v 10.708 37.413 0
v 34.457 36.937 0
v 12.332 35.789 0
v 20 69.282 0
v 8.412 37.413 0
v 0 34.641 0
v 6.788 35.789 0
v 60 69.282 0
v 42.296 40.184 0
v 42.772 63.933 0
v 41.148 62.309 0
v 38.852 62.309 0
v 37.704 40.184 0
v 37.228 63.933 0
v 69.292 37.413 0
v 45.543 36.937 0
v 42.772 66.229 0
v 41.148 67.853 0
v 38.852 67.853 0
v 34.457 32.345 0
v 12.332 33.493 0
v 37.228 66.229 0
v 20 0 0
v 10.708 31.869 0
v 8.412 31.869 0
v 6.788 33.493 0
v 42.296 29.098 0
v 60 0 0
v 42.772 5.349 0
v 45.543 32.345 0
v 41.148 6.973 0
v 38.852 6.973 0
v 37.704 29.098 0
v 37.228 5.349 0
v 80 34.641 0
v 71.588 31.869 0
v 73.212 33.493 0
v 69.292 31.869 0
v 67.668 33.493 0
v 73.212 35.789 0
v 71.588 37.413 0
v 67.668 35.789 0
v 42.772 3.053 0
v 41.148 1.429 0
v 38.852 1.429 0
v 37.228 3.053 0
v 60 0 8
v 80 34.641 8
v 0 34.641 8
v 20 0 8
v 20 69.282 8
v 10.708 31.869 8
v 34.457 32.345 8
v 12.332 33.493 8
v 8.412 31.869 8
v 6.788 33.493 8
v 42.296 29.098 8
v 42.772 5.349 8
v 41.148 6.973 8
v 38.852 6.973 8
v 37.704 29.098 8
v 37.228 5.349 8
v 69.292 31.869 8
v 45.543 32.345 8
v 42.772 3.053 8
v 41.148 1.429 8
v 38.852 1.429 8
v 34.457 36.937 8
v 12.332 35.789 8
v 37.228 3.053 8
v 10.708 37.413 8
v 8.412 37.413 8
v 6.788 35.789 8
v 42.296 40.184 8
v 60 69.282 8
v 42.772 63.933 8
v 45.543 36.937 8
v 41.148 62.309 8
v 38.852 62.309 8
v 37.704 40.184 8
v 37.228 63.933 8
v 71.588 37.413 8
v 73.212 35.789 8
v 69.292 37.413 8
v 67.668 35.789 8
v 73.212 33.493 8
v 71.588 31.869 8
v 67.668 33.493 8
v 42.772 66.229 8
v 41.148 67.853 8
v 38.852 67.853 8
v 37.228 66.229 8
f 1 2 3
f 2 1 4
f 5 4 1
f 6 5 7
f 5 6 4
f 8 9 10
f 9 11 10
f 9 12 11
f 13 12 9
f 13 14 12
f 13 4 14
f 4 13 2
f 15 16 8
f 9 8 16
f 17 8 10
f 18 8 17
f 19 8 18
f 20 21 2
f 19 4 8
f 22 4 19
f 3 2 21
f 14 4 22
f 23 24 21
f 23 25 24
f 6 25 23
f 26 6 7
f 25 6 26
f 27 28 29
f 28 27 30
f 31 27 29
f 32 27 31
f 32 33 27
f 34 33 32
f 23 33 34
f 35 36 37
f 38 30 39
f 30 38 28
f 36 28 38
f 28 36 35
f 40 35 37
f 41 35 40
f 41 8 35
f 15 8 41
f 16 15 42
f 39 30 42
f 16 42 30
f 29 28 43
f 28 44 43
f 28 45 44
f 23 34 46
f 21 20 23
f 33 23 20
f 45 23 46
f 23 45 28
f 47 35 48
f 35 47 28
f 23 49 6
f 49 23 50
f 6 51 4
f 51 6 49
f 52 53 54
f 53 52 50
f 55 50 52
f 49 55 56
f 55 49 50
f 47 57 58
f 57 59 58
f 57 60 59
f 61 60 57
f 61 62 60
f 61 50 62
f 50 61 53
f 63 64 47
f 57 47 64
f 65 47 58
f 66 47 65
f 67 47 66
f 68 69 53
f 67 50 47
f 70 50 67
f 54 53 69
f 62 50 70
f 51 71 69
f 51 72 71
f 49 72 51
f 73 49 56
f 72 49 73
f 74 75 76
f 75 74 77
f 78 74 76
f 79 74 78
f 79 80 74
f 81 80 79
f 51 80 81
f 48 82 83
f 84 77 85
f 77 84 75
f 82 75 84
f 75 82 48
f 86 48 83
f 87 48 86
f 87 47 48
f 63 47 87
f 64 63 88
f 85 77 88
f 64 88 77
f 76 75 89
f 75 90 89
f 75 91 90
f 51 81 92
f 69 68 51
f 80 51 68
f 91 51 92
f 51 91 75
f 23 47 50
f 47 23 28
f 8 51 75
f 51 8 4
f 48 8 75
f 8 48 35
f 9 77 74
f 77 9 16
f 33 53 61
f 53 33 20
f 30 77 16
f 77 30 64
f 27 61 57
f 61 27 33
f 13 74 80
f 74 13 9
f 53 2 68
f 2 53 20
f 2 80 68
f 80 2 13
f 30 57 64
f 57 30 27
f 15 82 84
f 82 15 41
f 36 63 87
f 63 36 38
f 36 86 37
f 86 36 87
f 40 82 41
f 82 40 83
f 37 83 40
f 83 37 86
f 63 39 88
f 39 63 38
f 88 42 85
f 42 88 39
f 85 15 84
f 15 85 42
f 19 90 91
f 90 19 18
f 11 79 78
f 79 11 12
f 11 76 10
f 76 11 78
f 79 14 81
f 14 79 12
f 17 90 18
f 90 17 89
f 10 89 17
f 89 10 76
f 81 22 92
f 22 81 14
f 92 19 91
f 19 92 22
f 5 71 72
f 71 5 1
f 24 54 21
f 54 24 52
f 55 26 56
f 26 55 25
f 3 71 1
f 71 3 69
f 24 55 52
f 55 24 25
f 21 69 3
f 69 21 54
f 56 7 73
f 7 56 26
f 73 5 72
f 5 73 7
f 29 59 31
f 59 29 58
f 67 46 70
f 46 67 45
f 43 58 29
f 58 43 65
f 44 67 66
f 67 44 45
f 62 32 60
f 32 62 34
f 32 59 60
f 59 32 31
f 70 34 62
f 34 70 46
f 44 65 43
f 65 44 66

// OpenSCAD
$fn = 32;

// ----------------------------------------------------------------------
// Polygon plate: 6-gon R40, 4 bolt windows
// ----------------------------------------------------------------------

// --- parameters (mm) ---
sides = 6;                // number of polygon sides
plate_r = 40;             // circumscribed radius of the polygon
bore_r = 6;               // centre bore radius
bolts = 4;                // number of bolt windows
ring_r = 30.44;           // bolt-circle radius
bolt_r = 3;               // bolt window radius
plate_t = 8;              // plate thickness, Z (extrusion height)

plate_d = 2 * plate_r;  // circumscribed diameter
bore_d = 2 * bore_r;  // centre bore diameter
bolt_d = 2 * bolt_r;  // bolt window diameter
ring_d = 2 * ring_r;  // bolt-circle diameter

profile = [[80, 34.641], [60, 69.282], [20, 69.282], [0, 34.641], [20, 0], [60, 0]];  // primary outline, 6 points, counter clockwise
void_1 = [[45.543, 36.937], [42.296, 40.184], [37.704, 40.184], [34.457, 36.937], [34.457, 32.345], [37.704, 29.098], [42.296, 29.098], [45.543, 32.345]];  // centre bore, 8 points
void_2 = [[73.212, 35.789], [71.588, 37.413], [69.292, 37.413], [67.668, 35.789], [67.668, 33.493], [69.292, 31.869], [71.588, 31.869], [73.212, 33.493]];  // bolt window 1, 8 points
void_3 = [[42.772, 66.229], [41.148, 67.853], [38.852, 67.853], [37.228, 66.229], [37.228, 63.933], [38.852, 62.309], [41.148, 62.309], [42.772, 63.933]];  // bolt window 2, 8 points
void_4 = [[12.332, 35.789], [10.708, 37.413], [8.412, 37.413], [6.788, 35.789], [6.788, 33.493], [8.412, 31.869], [10.708, 31.869], [12.332, 33.493]];  // bolt window 3, 8 points
void_5 = [[42.772, 5.349], [41.148, 6.973], [38.852, 6.973], [37.228, 5.349], [37.228, 3.053], [38.852, 1.429], [41.148, 1.429], [42.772, 3.053]];  // bolt window 4, 8 points

// --- the one profile operation ---
difference() {
  linear_extrude(height = plate_t) polygon(points = profile);
  translate([0, 0, -1])
    linear_extrude(height = plate_t + 2) polygon(points = void_1);
  translate([0, 0, -1])
    linear_extrude(height = plate_t + 2) polygon(points = void_2);
  translate([0, 0, -1])
    linear_extrude(height = plate_t + 2) polygon(points = void_3);
  translate([0, 0, -1])
    linear_extrude(height = plate_t + 2) polygon(points = void_4);
  translate([0, 0, -1])
    linear_extrude(height = plate_t + 2) polygon(points = void_5);
}
